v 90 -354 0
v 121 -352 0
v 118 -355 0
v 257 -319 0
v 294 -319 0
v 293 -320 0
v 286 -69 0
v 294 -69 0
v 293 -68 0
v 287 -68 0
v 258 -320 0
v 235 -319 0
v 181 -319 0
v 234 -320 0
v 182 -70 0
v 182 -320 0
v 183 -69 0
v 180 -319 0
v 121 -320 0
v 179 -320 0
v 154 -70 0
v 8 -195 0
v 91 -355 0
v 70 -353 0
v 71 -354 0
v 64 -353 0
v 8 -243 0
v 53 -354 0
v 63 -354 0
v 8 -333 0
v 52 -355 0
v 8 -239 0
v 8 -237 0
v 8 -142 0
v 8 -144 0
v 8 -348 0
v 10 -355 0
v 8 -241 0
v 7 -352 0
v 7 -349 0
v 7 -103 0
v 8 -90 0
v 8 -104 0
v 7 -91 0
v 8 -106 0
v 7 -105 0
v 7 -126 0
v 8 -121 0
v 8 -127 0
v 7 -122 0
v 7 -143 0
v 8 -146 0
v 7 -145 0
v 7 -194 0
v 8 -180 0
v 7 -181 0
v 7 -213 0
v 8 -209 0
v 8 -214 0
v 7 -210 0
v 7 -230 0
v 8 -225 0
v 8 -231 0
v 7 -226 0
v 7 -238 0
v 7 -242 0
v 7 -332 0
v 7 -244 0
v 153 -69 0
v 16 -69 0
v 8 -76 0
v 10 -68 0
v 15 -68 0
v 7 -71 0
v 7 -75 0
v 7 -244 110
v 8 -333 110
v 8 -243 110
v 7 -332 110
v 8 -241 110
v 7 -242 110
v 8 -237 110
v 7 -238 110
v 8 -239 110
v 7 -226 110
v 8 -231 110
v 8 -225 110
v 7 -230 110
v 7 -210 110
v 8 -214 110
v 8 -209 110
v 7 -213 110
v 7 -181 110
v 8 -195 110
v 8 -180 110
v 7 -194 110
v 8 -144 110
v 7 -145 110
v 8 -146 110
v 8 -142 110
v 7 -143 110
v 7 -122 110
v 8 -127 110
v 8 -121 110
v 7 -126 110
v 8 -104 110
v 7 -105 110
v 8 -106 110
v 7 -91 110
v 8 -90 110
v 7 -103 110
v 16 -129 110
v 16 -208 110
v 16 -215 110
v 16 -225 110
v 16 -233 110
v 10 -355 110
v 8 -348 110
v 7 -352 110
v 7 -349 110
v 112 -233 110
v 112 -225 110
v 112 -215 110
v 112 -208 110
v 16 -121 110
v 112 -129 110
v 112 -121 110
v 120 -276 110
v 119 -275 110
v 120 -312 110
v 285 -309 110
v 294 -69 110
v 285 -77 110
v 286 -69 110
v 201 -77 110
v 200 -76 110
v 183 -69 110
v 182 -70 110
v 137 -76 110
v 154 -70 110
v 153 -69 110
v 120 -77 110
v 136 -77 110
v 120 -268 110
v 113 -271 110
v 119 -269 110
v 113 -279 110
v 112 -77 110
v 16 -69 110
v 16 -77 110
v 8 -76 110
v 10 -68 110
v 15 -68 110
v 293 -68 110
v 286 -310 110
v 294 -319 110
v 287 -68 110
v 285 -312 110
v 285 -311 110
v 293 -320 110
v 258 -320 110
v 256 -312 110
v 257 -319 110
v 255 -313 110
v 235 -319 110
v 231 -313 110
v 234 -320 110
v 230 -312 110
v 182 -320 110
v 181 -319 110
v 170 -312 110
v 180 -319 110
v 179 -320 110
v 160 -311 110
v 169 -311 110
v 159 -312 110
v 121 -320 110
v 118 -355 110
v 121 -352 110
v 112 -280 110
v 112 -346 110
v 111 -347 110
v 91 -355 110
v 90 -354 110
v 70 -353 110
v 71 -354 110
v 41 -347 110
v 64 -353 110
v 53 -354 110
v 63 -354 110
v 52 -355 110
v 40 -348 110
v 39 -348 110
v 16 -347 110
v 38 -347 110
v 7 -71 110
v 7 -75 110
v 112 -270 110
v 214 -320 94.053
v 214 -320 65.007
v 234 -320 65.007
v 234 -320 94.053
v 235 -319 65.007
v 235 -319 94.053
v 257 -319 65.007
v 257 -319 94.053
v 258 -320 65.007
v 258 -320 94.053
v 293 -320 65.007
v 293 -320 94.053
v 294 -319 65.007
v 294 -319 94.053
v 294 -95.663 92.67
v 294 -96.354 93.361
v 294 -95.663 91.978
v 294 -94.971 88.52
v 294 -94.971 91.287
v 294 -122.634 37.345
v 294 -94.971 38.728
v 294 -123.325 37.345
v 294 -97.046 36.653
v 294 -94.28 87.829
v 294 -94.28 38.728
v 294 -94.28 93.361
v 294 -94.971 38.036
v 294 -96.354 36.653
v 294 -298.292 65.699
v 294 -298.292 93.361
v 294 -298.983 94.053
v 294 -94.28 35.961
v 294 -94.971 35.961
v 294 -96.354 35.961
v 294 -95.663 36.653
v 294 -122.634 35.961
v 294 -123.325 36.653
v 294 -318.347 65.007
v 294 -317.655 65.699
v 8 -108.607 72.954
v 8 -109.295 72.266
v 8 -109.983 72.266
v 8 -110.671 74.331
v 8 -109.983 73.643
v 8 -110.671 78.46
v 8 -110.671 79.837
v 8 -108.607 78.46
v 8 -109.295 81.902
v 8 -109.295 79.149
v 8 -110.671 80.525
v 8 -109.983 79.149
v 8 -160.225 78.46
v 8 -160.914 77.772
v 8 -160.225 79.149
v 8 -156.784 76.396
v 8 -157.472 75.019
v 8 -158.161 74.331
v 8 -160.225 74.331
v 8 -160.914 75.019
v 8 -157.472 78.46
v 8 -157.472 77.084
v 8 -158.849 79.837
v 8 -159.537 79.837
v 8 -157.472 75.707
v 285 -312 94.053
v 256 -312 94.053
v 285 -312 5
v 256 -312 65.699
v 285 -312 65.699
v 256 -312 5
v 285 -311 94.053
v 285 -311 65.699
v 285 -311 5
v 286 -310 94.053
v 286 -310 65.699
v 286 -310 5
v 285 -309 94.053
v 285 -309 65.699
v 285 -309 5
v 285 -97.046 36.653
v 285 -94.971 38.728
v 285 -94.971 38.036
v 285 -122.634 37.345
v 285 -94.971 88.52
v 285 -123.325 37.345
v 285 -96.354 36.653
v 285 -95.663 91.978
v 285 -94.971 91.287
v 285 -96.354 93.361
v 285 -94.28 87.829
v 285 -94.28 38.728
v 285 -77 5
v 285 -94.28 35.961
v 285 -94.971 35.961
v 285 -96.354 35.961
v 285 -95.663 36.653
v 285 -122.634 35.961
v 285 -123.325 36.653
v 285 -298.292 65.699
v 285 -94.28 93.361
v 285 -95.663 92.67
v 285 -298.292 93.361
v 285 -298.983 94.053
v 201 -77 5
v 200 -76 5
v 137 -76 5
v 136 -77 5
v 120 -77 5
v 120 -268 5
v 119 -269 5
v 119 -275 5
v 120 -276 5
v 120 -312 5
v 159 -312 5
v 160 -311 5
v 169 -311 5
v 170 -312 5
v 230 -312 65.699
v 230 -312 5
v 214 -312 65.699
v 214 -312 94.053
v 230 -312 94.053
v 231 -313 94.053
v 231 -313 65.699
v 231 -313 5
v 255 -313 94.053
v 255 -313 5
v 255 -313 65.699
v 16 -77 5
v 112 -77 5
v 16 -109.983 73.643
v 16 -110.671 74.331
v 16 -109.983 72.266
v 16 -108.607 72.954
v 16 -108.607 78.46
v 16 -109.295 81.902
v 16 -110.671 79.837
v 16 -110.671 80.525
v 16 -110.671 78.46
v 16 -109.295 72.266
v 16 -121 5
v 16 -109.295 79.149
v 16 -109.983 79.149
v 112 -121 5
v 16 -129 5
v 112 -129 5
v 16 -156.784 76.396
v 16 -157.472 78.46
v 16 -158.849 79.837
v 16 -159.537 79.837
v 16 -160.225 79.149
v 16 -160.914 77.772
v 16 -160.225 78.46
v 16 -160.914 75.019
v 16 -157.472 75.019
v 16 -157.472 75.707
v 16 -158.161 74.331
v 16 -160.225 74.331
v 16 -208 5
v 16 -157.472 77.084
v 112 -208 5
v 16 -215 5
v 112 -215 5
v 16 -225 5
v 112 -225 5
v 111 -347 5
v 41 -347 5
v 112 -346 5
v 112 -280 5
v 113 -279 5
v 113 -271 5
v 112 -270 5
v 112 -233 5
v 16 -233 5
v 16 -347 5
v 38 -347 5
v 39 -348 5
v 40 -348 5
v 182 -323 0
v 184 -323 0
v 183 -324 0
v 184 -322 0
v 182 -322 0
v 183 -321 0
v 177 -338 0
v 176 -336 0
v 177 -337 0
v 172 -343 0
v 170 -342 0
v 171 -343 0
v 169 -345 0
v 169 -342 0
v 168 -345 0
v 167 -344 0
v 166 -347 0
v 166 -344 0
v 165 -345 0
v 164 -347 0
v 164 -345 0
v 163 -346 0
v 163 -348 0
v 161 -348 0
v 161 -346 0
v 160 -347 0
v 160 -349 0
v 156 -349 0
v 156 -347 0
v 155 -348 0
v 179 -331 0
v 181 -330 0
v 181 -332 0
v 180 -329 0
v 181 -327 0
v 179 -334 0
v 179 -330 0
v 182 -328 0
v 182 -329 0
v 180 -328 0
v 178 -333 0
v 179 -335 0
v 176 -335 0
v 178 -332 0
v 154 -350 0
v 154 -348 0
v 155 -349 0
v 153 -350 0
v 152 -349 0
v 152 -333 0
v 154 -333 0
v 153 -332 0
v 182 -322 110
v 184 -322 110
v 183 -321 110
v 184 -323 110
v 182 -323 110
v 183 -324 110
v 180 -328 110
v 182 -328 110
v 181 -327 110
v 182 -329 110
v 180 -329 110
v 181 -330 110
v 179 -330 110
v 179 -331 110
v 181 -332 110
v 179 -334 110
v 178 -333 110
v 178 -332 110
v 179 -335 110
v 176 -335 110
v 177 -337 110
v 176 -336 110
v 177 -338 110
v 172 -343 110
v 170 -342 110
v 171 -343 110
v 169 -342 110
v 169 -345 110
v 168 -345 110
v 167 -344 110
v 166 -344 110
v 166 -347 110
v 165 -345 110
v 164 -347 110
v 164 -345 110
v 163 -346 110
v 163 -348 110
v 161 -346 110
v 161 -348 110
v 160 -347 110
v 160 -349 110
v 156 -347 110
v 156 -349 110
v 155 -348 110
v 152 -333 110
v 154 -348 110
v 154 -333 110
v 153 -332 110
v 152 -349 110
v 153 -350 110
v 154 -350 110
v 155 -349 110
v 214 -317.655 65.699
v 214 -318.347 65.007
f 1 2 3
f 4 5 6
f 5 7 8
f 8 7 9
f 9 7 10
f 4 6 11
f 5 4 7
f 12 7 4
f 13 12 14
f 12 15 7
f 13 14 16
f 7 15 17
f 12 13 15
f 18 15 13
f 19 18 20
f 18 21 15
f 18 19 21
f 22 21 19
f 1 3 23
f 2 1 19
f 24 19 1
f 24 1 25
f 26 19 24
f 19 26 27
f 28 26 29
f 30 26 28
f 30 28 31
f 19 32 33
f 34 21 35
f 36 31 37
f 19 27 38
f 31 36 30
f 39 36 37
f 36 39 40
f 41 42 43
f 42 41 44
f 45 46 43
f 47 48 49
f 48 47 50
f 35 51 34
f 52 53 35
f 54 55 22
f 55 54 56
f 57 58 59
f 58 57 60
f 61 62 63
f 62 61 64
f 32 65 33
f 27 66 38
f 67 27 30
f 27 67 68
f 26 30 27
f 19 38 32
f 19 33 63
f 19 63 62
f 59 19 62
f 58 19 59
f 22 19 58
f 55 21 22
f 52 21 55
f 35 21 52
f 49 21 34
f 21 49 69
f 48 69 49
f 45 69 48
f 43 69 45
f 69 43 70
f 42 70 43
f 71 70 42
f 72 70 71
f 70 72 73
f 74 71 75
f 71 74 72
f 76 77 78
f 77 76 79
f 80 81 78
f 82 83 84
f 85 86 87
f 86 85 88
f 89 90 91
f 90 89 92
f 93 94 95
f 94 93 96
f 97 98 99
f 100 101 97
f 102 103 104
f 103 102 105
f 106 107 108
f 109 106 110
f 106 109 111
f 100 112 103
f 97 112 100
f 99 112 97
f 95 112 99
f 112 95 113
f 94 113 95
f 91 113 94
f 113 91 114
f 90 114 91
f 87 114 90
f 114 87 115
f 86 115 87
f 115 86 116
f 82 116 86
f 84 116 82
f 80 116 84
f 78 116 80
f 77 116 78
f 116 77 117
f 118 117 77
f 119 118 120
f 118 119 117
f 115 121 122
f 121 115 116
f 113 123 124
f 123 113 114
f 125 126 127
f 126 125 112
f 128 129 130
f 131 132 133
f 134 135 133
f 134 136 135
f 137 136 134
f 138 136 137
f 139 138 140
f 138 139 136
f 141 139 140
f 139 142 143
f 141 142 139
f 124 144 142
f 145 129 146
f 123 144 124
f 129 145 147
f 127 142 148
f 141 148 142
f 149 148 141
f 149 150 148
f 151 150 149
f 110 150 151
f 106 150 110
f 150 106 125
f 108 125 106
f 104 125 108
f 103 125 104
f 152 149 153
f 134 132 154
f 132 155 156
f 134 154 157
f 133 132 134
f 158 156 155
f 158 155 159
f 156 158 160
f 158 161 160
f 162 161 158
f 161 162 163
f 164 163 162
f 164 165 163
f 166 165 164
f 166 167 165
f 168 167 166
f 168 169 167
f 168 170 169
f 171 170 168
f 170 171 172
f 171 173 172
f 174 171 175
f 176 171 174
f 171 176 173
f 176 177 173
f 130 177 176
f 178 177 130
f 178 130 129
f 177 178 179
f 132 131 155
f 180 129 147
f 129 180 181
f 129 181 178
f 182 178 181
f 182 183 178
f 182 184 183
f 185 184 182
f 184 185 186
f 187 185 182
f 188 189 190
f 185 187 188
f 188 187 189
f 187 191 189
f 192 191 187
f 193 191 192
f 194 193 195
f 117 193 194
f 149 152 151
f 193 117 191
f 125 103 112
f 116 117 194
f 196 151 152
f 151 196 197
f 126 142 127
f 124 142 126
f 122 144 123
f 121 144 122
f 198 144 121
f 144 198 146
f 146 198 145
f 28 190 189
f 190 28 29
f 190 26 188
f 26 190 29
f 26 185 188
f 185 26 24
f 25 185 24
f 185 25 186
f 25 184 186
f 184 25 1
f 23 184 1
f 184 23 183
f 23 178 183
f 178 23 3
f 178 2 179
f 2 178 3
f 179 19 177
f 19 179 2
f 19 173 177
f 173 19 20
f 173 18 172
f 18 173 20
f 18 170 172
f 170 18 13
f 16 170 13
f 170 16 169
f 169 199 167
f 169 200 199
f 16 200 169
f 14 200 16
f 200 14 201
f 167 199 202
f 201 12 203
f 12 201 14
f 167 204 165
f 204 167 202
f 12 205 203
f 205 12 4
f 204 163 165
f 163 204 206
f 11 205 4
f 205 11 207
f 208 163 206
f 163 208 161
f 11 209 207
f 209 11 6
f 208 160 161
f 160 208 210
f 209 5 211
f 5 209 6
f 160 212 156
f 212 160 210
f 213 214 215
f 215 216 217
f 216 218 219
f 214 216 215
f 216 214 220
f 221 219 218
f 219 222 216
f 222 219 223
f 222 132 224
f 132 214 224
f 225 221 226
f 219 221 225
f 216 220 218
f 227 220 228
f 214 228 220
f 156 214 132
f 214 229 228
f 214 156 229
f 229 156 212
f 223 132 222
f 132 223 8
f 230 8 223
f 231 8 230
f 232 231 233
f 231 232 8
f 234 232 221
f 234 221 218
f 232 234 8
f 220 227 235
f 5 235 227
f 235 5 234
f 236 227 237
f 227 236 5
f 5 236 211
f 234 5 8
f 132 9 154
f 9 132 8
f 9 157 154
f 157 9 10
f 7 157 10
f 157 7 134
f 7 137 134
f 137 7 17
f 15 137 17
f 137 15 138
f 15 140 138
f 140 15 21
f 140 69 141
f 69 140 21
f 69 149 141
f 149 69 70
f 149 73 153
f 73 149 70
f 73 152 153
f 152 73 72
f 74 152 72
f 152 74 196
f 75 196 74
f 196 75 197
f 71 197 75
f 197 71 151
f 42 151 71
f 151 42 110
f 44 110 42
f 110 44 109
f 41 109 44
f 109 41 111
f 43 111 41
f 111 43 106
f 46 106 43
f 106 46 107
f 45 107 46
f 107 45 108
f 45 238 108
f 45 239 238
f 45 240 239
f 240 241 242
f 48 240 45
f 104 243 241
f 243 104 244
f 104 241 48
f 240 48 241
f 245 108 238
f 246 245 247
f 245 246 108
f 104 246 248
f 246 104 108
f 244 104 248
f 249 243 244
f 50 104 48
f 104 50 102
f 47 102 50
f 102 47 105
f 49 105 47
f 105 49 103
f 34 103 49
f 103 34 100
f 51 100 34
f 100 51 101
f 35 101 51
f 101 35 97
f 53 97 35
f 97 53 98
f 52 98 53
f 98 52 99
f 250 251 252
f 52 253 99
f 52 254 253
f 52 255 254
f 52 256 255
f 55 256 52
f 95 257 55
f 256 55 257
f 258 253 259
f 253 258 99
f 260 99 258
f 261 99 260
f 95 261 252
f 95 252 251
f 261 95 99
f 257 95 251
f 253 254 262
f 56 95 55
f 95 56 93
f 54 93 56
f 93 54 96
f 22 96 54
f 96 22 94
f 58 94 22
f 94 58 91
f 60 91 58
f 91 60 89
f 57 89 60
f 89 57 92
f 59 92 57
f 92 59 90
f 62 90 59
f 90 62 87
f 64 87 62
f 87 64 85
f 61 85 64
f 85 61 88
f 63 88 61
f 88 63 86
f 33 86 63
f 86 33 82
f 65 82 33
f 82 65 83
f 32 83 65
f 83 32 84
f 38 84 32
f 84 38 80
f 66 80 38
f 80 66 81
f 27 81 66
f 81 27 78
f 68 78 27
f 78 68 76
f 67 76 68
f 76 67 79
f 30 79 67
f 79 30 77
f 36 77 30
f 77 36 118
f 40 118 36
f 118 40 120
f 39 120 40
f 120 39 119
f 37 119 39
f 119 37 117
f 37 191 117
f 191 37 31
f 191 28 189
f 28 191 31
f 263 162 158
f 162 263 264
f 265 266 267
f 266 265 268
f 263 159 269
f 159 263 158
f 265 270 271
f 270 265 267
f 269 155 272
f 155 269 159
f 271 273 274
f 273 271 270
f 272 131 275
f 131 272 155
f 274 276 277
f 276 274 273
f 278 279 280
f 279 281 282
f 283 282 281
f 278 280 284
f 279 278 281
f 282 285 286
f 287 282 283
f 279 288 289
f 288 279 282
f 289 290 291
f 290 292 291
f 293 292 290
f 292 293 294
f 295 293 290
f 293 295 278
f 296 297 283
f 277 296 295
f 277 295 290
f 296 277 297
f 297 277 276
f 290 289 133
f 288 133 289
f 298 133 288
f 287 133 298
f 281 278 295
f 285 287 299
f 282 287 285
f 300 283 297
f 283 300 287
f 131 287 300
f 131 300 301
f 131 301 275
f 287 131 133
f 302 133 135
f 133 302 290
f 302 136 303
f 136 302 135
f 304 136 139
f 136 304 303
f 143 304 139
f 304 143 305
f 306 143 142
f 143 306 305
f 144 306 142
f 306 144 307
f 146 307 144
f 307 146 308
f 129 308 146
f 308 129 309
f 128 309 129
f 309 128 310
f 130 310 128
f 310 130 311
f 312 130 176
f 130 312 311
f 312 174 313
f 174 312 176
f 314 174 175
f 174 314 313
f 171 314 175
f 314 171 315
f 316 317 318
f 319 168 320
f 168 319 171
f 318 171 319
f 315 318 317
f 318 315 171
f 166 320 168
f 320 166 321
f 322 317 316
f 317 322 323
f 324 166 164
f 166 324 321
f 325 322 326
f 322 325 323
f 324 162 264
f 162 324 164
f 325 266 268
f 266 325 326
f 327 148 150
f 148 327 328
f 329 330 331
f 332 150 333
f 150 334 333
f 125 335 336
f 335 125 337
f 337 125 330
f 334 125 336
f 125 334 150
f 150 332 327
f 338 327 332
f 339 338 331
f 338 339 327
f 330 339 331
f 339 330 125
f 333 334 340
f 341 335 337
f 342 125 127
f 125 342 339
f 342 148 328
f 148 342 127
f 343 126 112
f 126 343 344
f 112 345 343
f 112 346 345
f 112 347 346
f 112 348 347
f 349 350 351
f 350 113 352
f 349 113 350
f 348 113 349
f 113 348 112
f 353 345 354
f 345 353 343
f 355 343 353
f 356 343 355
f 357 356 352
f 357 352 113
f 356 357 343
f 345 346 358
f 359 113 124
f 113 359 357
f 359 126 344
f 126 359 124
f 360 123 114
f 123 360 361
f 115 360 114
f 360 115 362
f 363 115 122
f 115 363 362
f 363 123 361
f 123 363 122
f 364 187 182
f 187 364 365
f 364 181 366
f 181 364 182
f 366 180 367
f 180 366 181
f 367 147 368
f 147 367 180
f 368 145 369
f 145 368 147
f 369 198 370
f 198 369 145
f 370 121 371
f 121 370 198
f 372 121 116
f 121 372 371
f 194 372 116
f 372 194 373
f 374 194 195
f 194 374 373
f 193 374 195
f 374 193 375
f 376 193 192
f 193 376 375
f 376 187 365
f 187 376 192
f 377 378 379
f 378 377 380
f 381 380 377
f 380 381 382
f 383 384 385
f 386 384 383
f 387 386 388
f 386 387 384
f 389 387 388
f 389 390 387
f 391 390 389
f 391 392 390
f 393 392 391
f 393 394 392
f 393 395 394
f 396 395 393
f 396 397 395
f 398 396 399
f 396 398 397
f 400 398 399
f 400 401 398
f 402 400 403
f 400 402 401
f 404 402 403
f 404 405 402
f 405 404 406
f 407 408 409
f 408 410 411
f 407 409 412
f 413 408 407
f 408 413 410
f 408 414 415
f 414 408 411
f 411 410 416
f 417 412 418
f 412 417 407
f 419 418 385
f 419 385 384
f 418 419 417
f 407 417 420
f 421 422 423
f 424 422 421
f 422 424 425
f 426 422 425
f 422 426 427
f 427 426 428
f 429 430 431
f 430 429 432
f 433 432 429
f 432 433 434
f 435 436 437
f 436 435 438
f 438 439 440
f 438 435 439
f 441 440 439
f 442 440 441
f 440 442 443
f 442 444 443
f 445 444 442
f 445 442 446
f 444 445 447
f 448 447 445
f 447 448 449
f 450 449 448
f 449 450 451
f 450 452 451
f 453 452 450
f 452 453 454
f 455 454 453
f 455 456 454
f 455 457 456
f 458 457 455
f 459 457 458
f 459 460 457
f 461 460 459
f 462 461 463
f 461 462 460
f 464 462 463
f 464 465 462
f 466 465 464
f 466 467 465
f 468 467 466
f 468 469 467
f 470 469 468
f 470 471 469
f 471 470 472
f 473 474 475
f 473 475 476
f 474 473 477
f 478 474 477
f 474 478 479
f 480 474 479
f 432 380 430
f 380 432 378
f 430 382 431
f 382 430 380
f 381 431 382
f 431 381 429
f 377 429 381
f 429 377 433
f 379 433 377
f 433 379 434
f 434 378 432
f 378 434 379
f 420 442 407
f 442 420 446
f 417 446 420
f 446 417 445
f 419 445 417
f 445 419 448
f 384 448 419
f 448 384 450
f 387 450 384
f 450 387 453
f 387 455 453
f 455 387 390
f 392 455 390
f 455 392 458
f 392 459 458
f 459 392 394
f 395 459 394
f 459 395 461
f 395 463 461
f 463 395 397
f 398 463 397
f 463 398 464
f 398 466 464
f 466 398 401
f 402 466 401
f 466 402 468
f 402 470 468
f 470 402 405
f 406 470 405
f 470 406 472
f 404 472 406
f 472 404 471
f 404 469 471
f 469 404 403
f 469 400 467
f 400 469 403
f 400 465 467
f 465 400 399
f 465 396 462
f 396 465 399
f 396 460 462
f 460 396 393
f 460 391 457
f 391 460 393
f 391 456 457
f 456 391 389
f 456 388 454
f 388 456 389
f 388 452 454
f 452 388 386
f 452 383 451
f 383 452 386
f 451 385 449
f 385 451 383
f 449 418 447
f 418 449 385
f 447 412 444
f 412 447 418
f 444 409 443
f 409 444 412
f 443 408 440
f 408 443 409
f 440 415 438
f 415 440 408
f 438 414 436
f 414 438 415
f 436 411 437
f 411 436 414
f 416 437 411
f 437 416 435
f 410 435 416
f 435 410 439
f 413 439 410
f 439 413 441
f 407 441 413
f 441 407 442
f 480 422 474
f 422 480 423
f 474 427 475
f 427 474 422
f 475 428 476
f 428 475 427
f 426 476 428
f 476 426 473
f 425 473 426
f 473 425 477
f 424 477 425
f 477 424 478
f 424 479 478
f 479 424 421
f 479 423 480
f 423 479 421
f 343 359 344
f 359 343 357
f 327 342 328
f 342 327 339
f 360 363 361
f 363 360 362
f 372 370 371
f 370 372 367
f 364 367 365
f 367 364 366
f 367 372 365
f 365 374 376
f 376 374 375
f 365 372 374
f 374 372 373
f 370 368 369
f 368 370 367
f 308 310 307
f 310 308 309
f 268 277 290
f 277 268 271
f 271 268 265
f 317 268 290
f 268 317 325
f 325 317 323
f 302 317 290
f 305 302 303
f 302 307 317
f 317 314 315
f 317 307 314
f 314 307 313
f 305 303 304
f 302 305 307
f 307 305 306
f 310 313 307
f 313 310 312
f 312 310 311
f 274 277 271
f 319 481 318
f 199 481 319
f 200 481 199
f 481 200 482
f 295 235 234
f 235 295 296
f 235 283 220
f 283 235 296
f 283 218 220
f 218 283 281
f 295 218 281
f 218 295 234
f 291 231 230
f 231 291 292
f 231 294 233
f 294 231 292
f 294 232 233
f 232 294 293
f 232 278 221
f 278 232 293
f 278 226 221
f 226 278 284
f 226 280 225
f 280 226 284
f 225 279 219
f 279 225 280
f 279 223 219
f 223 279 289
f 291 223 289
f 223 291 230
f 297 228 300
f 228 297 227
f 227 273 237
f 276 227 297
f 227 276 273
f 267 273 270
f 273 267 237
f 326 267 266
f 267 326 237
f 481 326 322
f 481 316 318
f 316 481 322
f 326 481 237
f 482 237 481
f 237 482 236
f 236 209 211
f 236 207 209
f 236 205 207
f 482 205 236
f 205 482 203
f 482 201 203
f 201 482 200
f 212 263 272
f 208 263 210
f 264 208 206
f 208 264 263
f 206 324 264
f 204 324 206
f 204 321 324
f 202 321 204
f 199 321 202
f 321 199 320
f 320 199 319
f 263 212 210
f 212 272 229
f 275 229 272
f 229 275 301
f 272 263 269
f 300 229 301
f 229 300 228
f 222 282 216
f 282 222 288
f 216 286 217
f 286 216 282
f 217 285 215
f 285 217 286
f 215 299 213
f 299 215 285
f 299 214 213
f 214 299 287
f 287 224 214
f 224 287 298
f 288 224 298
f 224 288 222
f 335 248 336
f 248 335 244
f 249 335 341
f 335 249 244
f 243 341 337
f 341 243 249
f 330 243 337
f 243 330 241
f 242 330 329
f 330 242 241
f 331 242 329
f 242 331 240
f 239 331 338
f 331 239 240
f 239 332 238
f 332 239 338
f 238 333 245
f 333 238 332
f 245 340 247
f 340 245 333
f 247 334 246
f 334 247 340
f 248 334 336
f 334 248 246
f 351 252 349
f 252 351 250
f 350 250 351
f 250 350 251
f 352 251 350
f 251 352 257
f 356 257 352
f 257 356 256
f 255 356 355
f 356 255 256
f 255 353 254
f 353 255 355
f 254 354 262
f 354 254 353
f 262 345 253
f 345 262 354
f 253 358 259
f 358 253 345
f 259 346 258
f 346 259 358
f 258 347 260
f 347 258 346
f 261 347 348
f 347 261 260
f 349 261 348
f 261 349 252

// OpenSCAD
mirror(v = [0, 1, 0]) {
	color(c = [1, 0, 0]) {
		difference() {
			mirror(v = [0, 1, 0]) {
				union() {
					union() {
						difference() {
							linear_extrude(height = 110.0) {
								mirror(v = [0, 1, 0]) {
									polygon(paths = [[0, 1, 2, 3, 4, 5, 6, 7, 8, 9, 10, 11, 12, 13, 14, 15, 16, 17, 18, 19, 20, 21, 22, 23, 24, 25, 26, 27, 28, 29, 30, 31, 32, 33, 34, 35, 36, 37, 38, 39, 40, 41, 42, 43, 44, 45, 46, 47, 48, 49, 50, 51, 52, 53, 54, 55, 56, 57, 58, 59, 60, 61, 62, 63, 64, 65, 66, 67, 68, 69, 70, 71, 72, 73, 74]], points = [[10, 68], [15, 68], [16, 69], [153, 69], [154, 70], [182, 70], [183, 69], [286, 69], [287, 68], [293, 68], [294, 69], [294, 319], [293, 320], [258, 320], [257, 319], [235, 319], [234, 320], [182, 320], [181, 319], [180, 319], [179, 320], [121, 320], [121, 352], [118, 355], [91, 355], [90, 354], [71, 354], [70, 353], [64, 353], [63, 354], [53, 354], [52, 355], [10, 355], [7, 352], [7, 349], [8, 348], [8, 333], [7, 332], [7, 244], [8, 243], [7, 242], [8, 241], [8, 239], [7, 238], [8, 237], [8, 231], [7, 230], [7, 226], [8, 225], [8, 214], [7, 213], [7, 210], [8, 209], [8, 195], [7, 194], [7, 181], [8, 180], [8, 146], [7, 145], [8, 144], [7, 143], [8, 142], [8, 127], [7, 126], [7, 122], [8, 121], [8, 106], [7, 105], [8, 104], [7, 103], [7, 91], [8, 90], [8, 76], [7, 75], [7, 71]]);
								}
							}
							linear_extrude(height = 110.0) {
								mirror(v = [0, 1, 0]) {
									polygon(paths = [[0, 1, 2, 3, 4, 5, 6, 7, 8, 9, 10, 11, 12]], points = [[16, 233], [16, 347], [38, 347], [39, 348], [40, 348], [41, 347], [111, 347], [112, 346], [112, 280], [113, 279], [113, 271], [112, 270], [112, 233]]);
								}
								mirror(v = [0, 1, 0]) {
									polygon(paths = [[0, 1, 2, 3]], points = [[16, 215], [16, 225], [112, 225], [112, 215]]);
								}
								mirror(v = [0, 1, 0]) {
									polygon(paths = [[0, 1, 2, 3]], points = [[16, 129], [16, 208], [112, 208], [112, 129]]);
								}
								mirror(v = [0, 1, 0]) {
									polygon(paths = [[0, 1, 2, 3]], points = [[16, 77], [16, 121], [112, 121], [112, 77]]);
								}
								mirror(v = [0, 1, 0]) {
									polygon(paths = [[0, 1, 2, 3, 4, 5, 6, 7, 8, 9, 10, 11, 12, 13, 14, 15, 16, 17, 18, 19, 20, 21, 22]], points = [[137, 76], [136, 77], [120, 77], [120, 268], [119, 269], [119, 275], [120, 276], [120, 312], [159, 312], [160, 311], [169, 311], [170, 312], [230, 312], [231, 313], [255, 313], [256, 312], [285, 312], [285, 311], [286, 310], [285, 309], [285, 77], [201, 77], [200, 76]]);
								}
							}
						}
						linear_extrude(height = 110.0) {
							mirror(v = [0, 1, 0]) {
								polygon(paths = [[0, 1, 2, 3, 4, 5]], points = [[155, 348], [156, 347], [160, 347], [161, 348], [160, 349], [156, 349]]);
							}
							mirror(v = [0, 1, 0]) {
								polygon(paths = [[0, 1, 2, 3, 4, 5]], points = [[160, 347], [161, 346], [163, 346], [164, 347], [163, 348], [161, 348]]);
							}
							mirror(v = [0, 1, 0]) {
								polygon(paths = [[0, 1, 2, 3, 4, 5, 6, 7]], points = [[165, 345], [166, 344], [167, 344], [168, 345], [166, 347], [164, 347], [163, 346], [164, 345]]);
							}
							mirror(v = [0, 1, 0]) {
								polygon(paths = [[0, 1, 2, 3, 4, 5]], points = [[169, 342], [170, 342], [171, 343], [169, 345], [168, 345], [167, 344]]);
							}
							mirror(v = [0, 1, 0]) {
								polygon(paths = [[0, 1, 2, 3, 4, 5]], points = [[176, 336], [177, 337], [177, 338], [172, 343], [171, 343], [170, 342]]);
							}
							mirror(v = [0, 1, 0]) {
								polygon(paths = [[0, 1, 2, 3, 4, 5]], points = [[178, 333], [179, 334], [179, 335], [177, 337], [176, 336], [176, 335]]);
							}
							mirror(v = [0, 1, 0]) {
								polygon(paths = [[0, 1, 2, 3, 4, 5, 6, 7]], points = [[152, 333], [153, 332], [154, 333], [154, 348], [155, 349], [154, 350], [153, 350], [152, 349]]);
							}
							mirror(v = [0, 1, 0]) {
								polygon(paths = [[0, 1, 2, 3, 4, 5, 6, 7]], points = [[179, 330], [180, 329], [181, 330], [181, 332], [179, 334], [178, 333], [178, 332], [179, 331]]);
							}
							mirror(v = [0, 1, 0]) {
								polygon(paths = [[0, 1, 2, 3, 4, 5]], points = [[180, 328], [181, 327], [182, 328], [182, 329], [181, 330], [180, 329]]);
							}
							mirror(v = [0, 1, 0]) {
								polygon(paths = [[0, 1, 2, 3, 4, 5]], points = [[182, 322], [183, 321], [184, 322], [184, 323], [183, 324], [182, 323]]);
							}
						}
					}
					color(c = [1, 0, 0]) {
						linear_extrude(height = 5) {
							mirror(v = [0, 1, 0]) {
								polygon(paths = [[0, 1, 2, 3, 4, 5, 6, 7, 8, 9, 10, 11, 12, 13, 14, 15, 16, 17, 18, 19, 20, 21, 22, 23, 24, 25, 26, 27, 28, 29, 30, 31, 32, 33, 34, 35, 36, 37, 38, 39, 40, 41, 42, 43, 44, 45, 46, 47, 48, 49, 50, 51, 52, 53, 54, 55, 56, 57, 58, 59, 60, 61, 62, 63, 64, 65, 66, 67, 68, 69, 70, 71, 72, 73, 74]], points = [[10, 68], [15, 68], [16, 69], [153, 69], [154, 70], [182, 70], [183, 69], [286, 69], [287, 68], [293, 68], [294, 69], [294, 319], [293, 320], [258, 320], [257, 319], [235, 319], [234, 320], [182, 320], [181, 319], [180, 319], [179, 320], [121, 320], [121, 352], [118, 355], [91, 355], [90, 354], [71, 354], [70, 353], [64, 353], [63, 354], [53, 354], [52, 355], [10, 355], [7, 352], [7, 349], [8, 348], [8, 333], [7, 332], [7, 244], [8, 243], [7, 242], [8, 241], [8, 239], [7, 238], [8, 237], [8, 231], [7, 230], [7, 226], [8, 225], [8, 214], [7, 213], [7, 210], [8, 209], [8, 195], [7, 194], [7, 181], [8, 180], [8, 146], [7, 145], [8, 144], [7, 143], [8, 142], [8, 127], [7, 126], [7, 122], [8, 121], [8, 106], [7, 105], [8, 104], [7, 103], [7, 91], [8, 90], [8, 76], [7, 75], [7, 71]]);
							}
						}
					}
				}
			}
			union() {
				union() {
					union() {
						union() {
							translate(v = [302.3188405797101, 48, 126.8623188405797]) {
								rotate(a = 90, v = [-1, 0, 0]) {
									rotate(a = 180, v = [0, 1, 0]) {
										linear_extrude(center = true, height = 200) {
											polygon(paths = [[0, 1, 2, 3]], points = [[248.1787439614, 81.8019323671], [248.8719806763, 81.1086956522], [249.5652173913, 81.8019323671], [248.8719806763, 82.4951690821]]);
											polygon(paths = [[0, 1, 2, 3, 4, 5, 6, 7, 8, 9]], points = [[220.4492753623, 59.6183574879], [221.1425120773, 58.9251207729], [221.8357487923, 58.9251207729], [222.5289855072, 59.6183574879], [222.5289855072, 61.0048309179], [223.2222222222, 61.6980676329], [222.5289855072, 62.3913043478], [222.5289855072, 63.0845410628], [221.8357487923, 63.7777777778], [220.4492753623, 62.3913043478]]);
											polygon(paths = [[0, 1, 2, 3, 4, 5, 6, 7, 8, 9, 10, 11, 12, 13, 14, 15, 16, 17, 18, 19, 20, 21, 22, 23, 24, 25, 26, 27, 28, 29, 30, 31, 32, 33, 34, 35, 36, 37, 38, 39, 40, 41, 42, 43, 44, 45, 46, 47, 48, 49, 50, 51, 52, 53, 54, 55, 56, 57, 58, 59, 60, 61, 62, 63, 64, 65, 66, 67, 68, 69, 70, 71, 72, 73, 74, 75, 76, 77, 78, 79, 80, 81, 82, 83, 84]], points = [[228.0748792271, 51.2995169082], [228.7681159420, 51.9927536232], [228.7681159420, 61.0048309179], [229.4613526570, 61.6980676329], [229.4613526570, 64.4710144928], [230.1545893720, 65.1642512077], [230.1545893720, 67.2439613527], [230.1545893720, 66.5507246377], [230.8478260870, 65.8574879227], [230.8478260870, 65.1642512077], [231.5410628019, 64.4710144928], [231.5410628019, 63.0845410628], [232.2342995169, 62.3913043478], [232.2342995169, 61.6980676329], [232.9275362319, 61.0048309179], [233.6207729469, 61.0048309179], [235.0072463768, 62.3913043478], [235.0072463768, 61.6980676329], [236.3937198068, 60.3115942029], [237.7801932367, 61.6980676329], [237.7801932367, 62.3913043478], [238.4734299517, 63.0845410628], [238.4734299517, 67.9371980676], [239.1666666667, 68.6304347826], [239.1666666667, 74.8695652174], [238.4734299517, 75.5628019324], [238.4734299517, 76.2560386473], [237.0869565217, 77.6425120773], [236.3937198068, 77.6425120773], [235.7004830918, 76.9492753623], [234.3140096618, 76.9492753623], [234.3140096618, 77.6425120773], [232.9275362319, 79.0289855072], [233.6207729469, 79.7222222222], [237.0869565217, 79.7222222222], [237.7801932367, 80.4154589372], [238.4734299517, 80.4154589372], [239.1666666667, 81.1086956522], [239.1666666667, 81.8019323671], [239.8599033816, 82.4951690821], [239.8599033816, 83.1884057971], [239.1666666667, 83.8816425121], [239.1666666667, 84.5748792271], [238.4734299517, 85.2681159420], [237.0869565217, 85.2681159420], [236.3937198068, 85.9613526570], [235.7004830918, 85.2681159420], [234.3140096618, 85.2681159420], [233.6207729469, 85.9613526570], [230.1545893720, 85.9613526570], [229.4613526570, 86.6545893720], [228.7681159420, 86.6545893720], [228.0748792271, 87.3478260870], [226.6884057971, 87.3478260870], [225.9951690821, 86.6545893720], [223.9154589372, 86.6545893720], [223.2222222222, 85.9613526570], [219.7560386473, 85.9613526570], [218.3695652174, 84.5748792271], [217.6763285024, 84.5748792271], [216.9830917874, 83.8816425121], [217.6763285024, 83.1884057971], [217.6763285024, 82.4951690821], [219.7560386473, 80.4154589372], [223.2222222222, 80.4154589372], [223.9154589372, 79.7222222222], [223.9154589372, 79.0289855072], [224.6086956522, 78.3357487923], [223.9154589372, 77.6425120773], [223.9154589372, 74.8695652174], [223.2222222222, 74.1763285024], [223.9154589372, 73.4830917874], [223.9154589372, 69.3236714976], [224.6086956522, 68.6304347826], [224.6086956522, 67.9371980676], [223.9154589372, 67.2439613527], [223.9154589372, 65.1642512077], [224.6086956522, 64.4710144928], [224.6086956522, 60.3115942029], [225.3019323671, 59.6183574879], [225.3019323671, 58.2318840580], [225.9951690821, 57.5386473430], [225.9951690821, 54.0724637681], [226.6884057971, 53.3792270531], [226.6884057971, 52.6859903382]]);
											polygon(paths = [[0, 1, 2, 3, 4, 5]], points = [[123.3961352657, 36.0483091787], [124.0893719807, 35.3550724638], [125.4758454106, 35.3550724638], [126.1690821256, 36.0483091787], [125.4758454106, 36.7415458937], [124.0893719807, 36.7415458937]]);
											polygon(paths = [[0, 1, 2, 3]], points = [[1.3864734300, 25.6497584541], [2.0797101449, 24.9565217391], [2.7729468599, 25.6497584541], [2.0797101449, 26.3429951691]]);
											polygon(paths = [[0, 1, 2, 3]], points = [[103.2922705314, 22.1835748792], [103.9855072464, 21.4903381643], [104.6787439614, 22.1835748792], [103.9855072464, 22.8768115942]]);
											polygon(paths = [[0, 1, 2, 3, 4, 5, 6, 7, 8, 9, 10, 11, 12, 13, 14]], points = [[117.1570048309, 21.4903381643], [117.8502415459, 20.7971014493], [142.1135265700, 20.7971014493], [142.8067632850, 21.4903381643], [142.1135265700, 22.1835748792], [141.4202898551, 22.1835748792], [140.7270531401, 22.8768115942], [134.4879227053, 22.8768115942], [133.1014492754, 24.2632850242], [122.7028985507, 24.2632850242], [122.0096618357, 23.5700483092], [122.0096618357, 22.8768115942], [119.2367149758, 22.8768115942], [118.5434782609, 22.1835748792], [117.8502415459, 22.1835748792]]);
											polygon(paths = [[0, 1, 2, 3, 4, 5, 6, 7, 8, 9, 10, 11]], points = [[113.6908212560, 19.4106280193], [114.3840579710, 18.7173913043], [140.7270531401, 18.7173913043], [141.4202898551, 19.4106280193], [140.7270531401, 20.1038647343], [140.0338164251, 20.1038647343], [139.3405797101, 20.7971014493], [124.0893719807, 20.7971014493], [123.3961352657, 20.1038647343], [122.7028985507, 20.7971014493], [122.0096618357, 20.1038647343], [114.3840579710, 20.1038647343]]);
											polygon(paths = [[0, 1, 2, 3, 4, 5, 6, 7, 8, 9, 10, 11, 12, 13]], points = [[108.1449275362, 18.7173913043], [108.8381642512, 18.0241545894], [112.3043478261, 18.0241545894], [113.6908212560, 19.4106280193], [112.9975845411, 20.1038647343], [112.3043478261, 20.1038647343], [111.6111111111, 19.4106280193], [110.9178743961, 19.4106280193], [110.2246376812, 20.1038647343], [108.1449275362, 20.1038647343], [107.4516908213, 20.7971014493], [106.7584541063, 20.1038647343], [106.7584541063, 19.4106280193], [107.4516908213, 18.7173913043]]);
											polygon(paths = [[0, 1, 2, 3, 4, 5, 6, 7, 8]], points = [[106.0652173913, 17.3309178744], [108.1449275362, 17.3309178744], [108.8381642512, 18.0241545894], [108.1449275362, 18.7173913043], [107.4516908213, 18.7173913043], [106.0652173913, 20.1038647343], [105.3719806763, 20.1038647343], [104.6787439614, 19.4106280193], [104.6787439614, 18.7173913043]]);
											polygon(paths = [[0]], points = [[232.9275362319, 122.7028985507]]);
											polygon(paths = [[0, 1, 2, 3, 4, 5, 6, 7, 8, 9, 10, 11, 12, 13, 14, 15, 16, 17, 18, 19, 20, 21, 22, 23, 24, 25, 26, 27, 28, 29, 30, 31, 32, 33, 34, 35, 36, 37, 38, 39, 40, 41, 42, 43]], points = [[173.3091787440, 92.8937198068], [173.3091787440, 94.2801932367], [172.6159420290, 94.9734299517], [172.6159420290, 95.6666666667], [171.9227053140, 96.3599033816], [171.9227053140, 97.0531400966], [171.2294685990, 97.7463768116], [171.2294685990, 112.3043478261], [170.5362318841, 112.9975845411], [170.5362318841, 114.3840579710], [171.2294685990, 115.0772946860], [171.2294685990, 117.1570048309], [171.9227053140, 116.4637681159], [172.6159420290, 116.4637681159], [173.3091787440, 117.1570048309], [173.3091787440, 116.4637681159], [174.0024154589, 115.7705314010], [174.0024154589, 115.0772946860], [174.6956521739, 114.3840579710], [174.6956521739, 111.6111111111], [175.3888888889, 110.9178743961], [175.3888888889, 110.2246376812], [176.0821256039, 109.5314009662], [176.0821256039, 107.4516908213], [177.4685990338, 106.0652173913], [178.1618357488, 106.7584541063], [179.5483091787, 105.3719806763], [180.2415458937, 105.3719806763], [180.2415458937, 104.6787439614], [180.9347826087, 103.9855072464], [180.9347826087, 102.5990338164], [181.6280193237, 101.9057971014], [181.6280193237, 99.8260869565], [180.2415458937, 98.4396135266], [178.8550724638, 99.8260869565], [178.1618357488, 99.8260869565], [176.7753623188, 98.4396135266], [176.7753623188, 97.7463768116], [176.0821256039, 97.0531400966], [176.0821256039, 95.6666666667], [175.3888888889, 95.6666666667], [174.6956521739, 94.9734299517], [174.6956521739, 93.5869565217], [174.0024154589, 93.5869565217]]);
											polygon(paths = [[0, 1]], points = [[100.5193236715, 85.2681159420], [100.5193236715, 87.3478260870]]);
											polygon(paths = [[0, 1, 2, 3, 4, 5, 6, 7, 8, 9, 10, 11, 12, 13, 14, 15, 16, 17, 18, 19, 20, 21, 22, 23, 24, 25, 26, 27, 28, 29, 30, 31, 32, 33, 34, 35, 36, 37]], points = [[90.8140096618, 85.2681159420], [90.1207729469, 85.9613526570], [88.7342995169, 85.9613526570], [88.0410628019, 86.6545893720], [86.6545893720, 86.6545893720], [85.9613526570, 85.9613526570], [83.1884057971, 85.9613526570], [82.4951690821, 86.6545893720], [81.1086956522, 86.6545893720], [79.7222222222, 88.0410628019], [81.1086956522, 89.4275362319], [81.1086956522, 90.1207729469], [82.4951690821, 91.5072463768], [82.4951690821, 92.2004830918], [83.8816425121, 93.5869565217], [83.8816425121, 94.2801932367], [84.5748792271, 94.2801932367], [85.2681159420, 94.9734299517], [86.6545893720, 94.9734299517], [87.3478260870, 94.2801932367], [88.0410628019, 94.2801932367], [88.7342995169, 94.9734299517], [89.4275362319, 94.9734299517], [90.1207729469, 95.6666666667], [90.8140096618, 95.6666666667], [91.5072463768, 96.3599033816], [92.2004830918, 95.6666666667], [92.8937198068, 95.6666666667], [94.2801932367, 94.2801932367], [94.2801932367, 93.5869565217], [94.9734299517, 92.8937198068], [94.9734299517, 92.2004830918], [95.6666666667, 91.5072463768], [95.6666666667, 90.8140096618], [96.3599033816, 90.1207729469], [96.3599033816, 88.0410628019], [97.0531400966, 87.3478260870], [94.9734299517, 85.2681159420]]);
										}
									}
								}
							}
							translate(v = [0.01703163017031617, 375, 139.6593673965937]) {
								rotate(a = 90, v = [1, 0, 0]) {
									rotate(a = 180, v = [1, 0, 0]) {
										linear_extrude(center = true, height = 200) {
											polygon(paths = [[0, 1, 2, 3, 4, 5, 6, 7, 8, 9, 10, 11, 12, 13, 14]], points = [[162.0048661800, 113.1240875912], [160.6082725061, 114.5206812652], [158.5133819951, 114.5206812652], [157.8150851582, 113.8223844282], [157.1167883212, 113.8223844282], [157.1167883212, 133.3746958637], [156.4184914842, 134.0729927007], [156.4184914842, 135.4695863747], [161.3065693431, 135.4695863747], [162.0048661800, 134.7712895377], [162.7031630170, 134.7712895377], [163.4014598540, 135.4695863747], [164.7980535280, 135.4695863747], [164.0997566910, 134.7712895377], [164.0997566910, 113.1240875912]]);
											polygon(paths = [[0, 1, 2, 3, 4, 5]], points = [[161.3065693431, 120.8053527981], [162.0048661800, 120.1070559611], [162.7031630170, 120.8053527981], [162.7031630170, 125.6934306569], [162.0048661800, 126.3917274939], [161.3065693431, 125.6934306569]]);
											polygon(paths = [[0, 1, 2, 3, 4, 5, 6, 7]], points = [[158.5133819951, 118.7104622871], [159.2116788321, 118.0121654501], [159.9099756691, 118.0121654501], [160.6082725061, 118.7104622871], [160.6082725061, 120.1070559611], [159.9099756691, 120.8053527981], [159.2116788321, 120.8053527981], [158.5133819951, 120.1070559611]]);
											polygon(paths = [[0, 1, 2, 3]], points = [[158.5133819951, 115.9172749392], [159.2116788321, 115.2189781022], [159.9099756691, 115.9172749392], [159.2116788321, 116.6155717762]]);
											polygon(paths = [[0, 1, 2, 3, 4, 5]], points = [[161.3065693431, 113.8223844282], [162.0048661800, 113.1240875912], [162.7031630170, 113.1240875912], [163.4014598540, 113.8223844282], [162.7031630170, 114.5206812652], [162.0048661800, 114.5206812652]]);
											polygon(paths = [[0, 1, 2, 3, 4, 5, 6, 7, 8, 9, 10, 11, 12, 13, 14, 15]], points = [[171.7810218978, 112.4257907543], [171.7810218978, 113.8223844282], [171.0827250608, 114.5206812652], [171.0827250608, 116.6155717762], [171.7810218978, 117.3138686131], [171.7810218978, 132.6763990268], [171.0827250608, 133.3746958637], [171.0827250608, 135.4695863747], [179.4622871046, 135.4695863747], [179.4622871046, 119.4087591241], [178.7639902676, 118.7104622871], [179.4622871046, 118.0121654501], [178.7639902676, 117.3138686131], [178.7639902676, 113.1240875912], [175.9708029197, 113.1240875912], [175.2725060827, 112.4257907543]]);
											polygon(paths = [[0]], points = [[274.4306569343, 101.2530413625]]);
											polygon(paths = [[0, 1]], points = [[90.0802919708, 101.2530413625], [90.7785888078, 101.2530413625]]);
											polygon(paths = [[0, 1]], points = [[89.3819951338, 96.3649635036], [90.0802919708, 97.0632603406]]);
											polygon(paths = [[0, 1, 2, 3, 4, 5, 6, 7, 8, 9, 10, 11, 12, 13, 14, 15, 16, 17]], points = [[159.9099756691, 81.7007299270], [159.2116788321, 82.3990267640], [157.1167883212, 82.3990267640], [157.1167883212, 102.6496350365], [156.4184914842, 103.3479318735], [156.4184914842, 104.7445255474], [157.8150851582, 104.7445255474], [158.5133819951, 104.0462287105], [162.7031630170, 104.0462287105], [163.4014598540, 104.7445255474], [164.0997566910, 104.7445255474], [164.7980535280, 104.0462287105], [164.7980535280, 87.2871046229], [164.0997566910, 86.5888077859], [164.0997566910, 81.7007299270], [163.4014598540, 82.3990267640], [162.7031630170, 82.3990267640], [162.0048661800, 81.7007299270]]);
											polygon(paths = [[0, 1, 2, 3]], points = [[157.8150851582, 103.3479318735], [158.5133819951, 102.6496350365], [159.2116788321, 103.3479318735], [158.5133819951, 104.0462287105]]);
											polygon(paths = [[0, 1, 2, 3]], points = [[159.9099756691, 94.2700729927], [160.6082725061, 93.5717761557], [161.3065693431, 94.2700729927], [160.6082725061, 94.9683698297]]);
											polygon(paths = [[0, 1, 2, 3, 4, 5, 6, 7]], points = [[159.2116788321, 91.4768856448], [159.9099756691, 90.7785888078], [160.6082725061, 90.7785888078], [161.3065693431, 91.4768856448], [161.3065693431, 92.8734793187], [160.6082725061, 93.5717761557], [159.9099756691, 93.5717761557], [159.2116788321, 92.8734793187]]);
											polygon(paths = [[0, 1, 2, 3, 4, 5]], points = [[161.3065693431, 90.7785888078], [162.0048661800, 90.0802919708], [162.7031630170, 90.7785888078], [162.7031630170, 96.3649635036], [162.0048661800, 97.0632603406], [161.3065693431, 96.3649635036]]);
											polygon(paths = [[0, 1, 2, 3, 4, 5, 6, 7, 8]], points = [[158.5133819951, 86.5888077859], [159.2116788321, 85.8905109489], [159.9099756691, 85.8905109489], [160.6082725061, 86.5888077859], [160.6082725061, 90.0802919708], [159.9099756691, 90.7785888078], [159.2116788321, 90.0802919708], [159.2116788321, 89.3819951338], [158.5133819951, 88.6836982968]]);
											polygon(paths = [[0, 1, 2, 3]], points = [[159.9099756691, 83.0973236010], [160.6082725061, 82.3990267640], [161.3065693431, 83.0973236010], [160.6082725061, 83.7956204380]]);
											polygon(paths = [[0, 1, 2, 3, 4]], points = [[182.2554744526, 66.3381995134], [182.2554744526, 74.7177615572], [182.9537712895, 75.4160583942], [182.9537712895, 77.5109489051], [182.9537712895, 67.0364963504]]);
											polygon(paths = [[0, 1, 2, 3, 4, 5, 6, 7, 8, 9, 10, 11, 12, 13, 14, 15, 16, 17, 18, 19, 20, 21, 22, 23, 24, 25, 26, 27, 28, 29, 30, 31, 32, 33, 34, 35, 36, 37, 38, 39, 40, 41, 42, 43, 44, 45, 46, 47, 48, 49]], points = [[171.0827250608, 65.6399026764], [171.0827250608, 74.7177615572], [174.5742092457, 74.7177615572], [175.2725060827, 74.0194647202], [176.6690997567, 74.0194647202], [177.3673965937, 74.7177615572], [179.4622871046, 74.7177615572], [180.1605839416, 75.4160583942], [179.4622871046, 76.1143552311], [180.1605839416, 76.8126520681], [179.4622871046, 77.5109489051], [180.1605839416, 78.2092457421], [179.4622871046, 78.9075425791], [178.7639902676, 78.9075425791], [178.0656934307, 79.6058394161], [178.7639902676, 80.3041362530], [177.3673965937, 81.7007299270], [171.7810218978, 81.7007299270], [171.7810218978, 84.4939172749], [171.0827250608, 85.1922141119], [171.7810218978, 85.8905109489], [171.7810218978, 95.6666666667], [171.0827250608, 96.3649635036], [171.7810218978, 97.0632603406], [171.7810218978, 97.7615571776], [171.0827250608, 98.4598540146], [171.7810218978, 99.1581508516], [171.0827250608, 99.8564476886], [171.0827250608, 104.7445255474], [173.8759124088, 104.7445255474], [174.5742092457, 104.0462287105], [178.7639902676, 104.0462287105], [178.7639902676, 100.5547445255], [179.4622871046, 99.8564476886], [178.7639902676, 99.1581508516], [178.7639902676, 92.1751824818], [179.4622871046, 91.4768856448], [179.4622871046, 86.5888077859], [178.7639902676, 85.8905109489], [178.7639902676, 84.4939172749], [179.4622871046, 83.7956204380], [178.7639902676, 83.0973236010], [179.4622871046, 82.3990267640], [179.4622871046, 81.0024330900], [180.1605839416, 80.3041362530], [180.1605839416, 79.6058394161], [180.8588807786, 78.9075425791], [180.8588807786, 70.5279805353], [180.1605839416, 69.8296836983], [180.1605839416, 65.6399026764]]);
											polygon(paths = [[0, 1, 2, 3, 4, 5, 6, 7, 8, 9, 10, 11, 12, 13, 14, 15, 16, 17, 18, 19, 20, 21, 22, 23]], points = [[156.4184914842, 65.6399026764], [155.7201946472, 66.3381995134], [155.7201946472, 70.5279805353], [155.0218978102, 71.2262773723], [154.3236009732, 70.5279805353], [154.3236009732, 69.8296836983], [153.6253041363, 69.1313868613], [153.6253041363, 67.7347931873], [152.9270072993, 67.0364963504], [152.9270072993, 71.2262773723], [153.6253041363, 71.9245742092], [153.6253041363, 72.6228710462], [155.0218978102, 71.2262773723], [155.7201946472, 71.2262773723], [156.4184914842, 71.9245742092], [156.4184914842, 73.3211678832], [155.7201946472, 74.0194647202], [156.4184914842, 74.7177615572], [164.7980535280, 74.7177615572], [164.7980535280, 66.3381995134], [164.0997566910, 65.6399026764], [163.4014598540, 65.6399026764], [162.7031630170, 66.3381995134], [162.0048661800, 65.6399026764]]);
											polygon(paths = [[0, 1]], points = [[219.2652068127, 64.2433090024], [219.2652068127, 66.3381995134]]);
											polygon(paths = [[0]], points = [[219.2652068127, 62.8467153285]]);
											polygon(paths = [[0]], points = [[88.6836982968, 61.4501216545]]);
										}
									}
								}
							}
						}
						translate(v = [314, 360.53253012048197, 136.23855421686747]) {
							rotate(a = 90, v = [-1, 0, 0]) {
								rotate(a = 90, v = [0, 1, 0]) {
									linear_extrude(center = true, height = 200) {
										polygon(paths = [[0, 1, 2, 3]], points = [[237.2072289157, 98.8939759036], [237.2072289157, 99.5855421687], [237.8987951807, 100.2771084337], [237.8987951807, 98.8939759036]]);
										polygon(paths = [[0, 1, 2, 3, 4, 5, 6, 7, 8, 9]], points = [[265.5614457831, 97.5108433735], [265.5614457831, 98.2024096386], [264.1783132530, 99.5855421687], [262.7951807229, 99.5855421687], [263.4867469880, 99.5855421687], [264.1783132530, 100.2771084337], [264.8698795181, 99.5855421687], [265.5614457831, 100.2771084337], [266.2530120482, 100.2771084337], [266.2530120482, 97.5108433735]]);
										polygon(paths = [[0, 1, 2, 3, 4, 5, 6, 7]], points = [[263.4867469880, 42.8771084337], [264.1783132530, 42.8771084337], [264.8698795181, 43.5686746988], [264.8698795181, 44.2602409639], [265.5614457831, 44.9518072289], [265.5614457831, 47.7180722892], [266.2530120482, 48.4096385542], [266.2530120482, 42.8771084337]]);
										polygon(paths = [[0, 1, 2, 3, 4, 5, 6, 7, 8, 9]], points = [[33.8867469880, 42.1855421687], [33.8867469880, 42.8771084337], [33.1951807229, 43.5686746988], [33.1951807229, 70.5397590361], [33.8867469880, 71.2313253012], [42.1855421687, 71.2313253012], [42.8771084337, 70.5397590361], [62.2409638554, 70.5397590361], [62.2409638554, 42.8771084337], [61.5493975904, 42.1855421687]]);
									}
								}
							}
						}
					}
					translate(v = [-13, 61.805755395683455, 149.35011990407676]) {
						rotate(a = 90, v = [-1, 0, 0]) {
							rotate(a = 90, v = [0, -1, 0]) {
								linear_extrude(center = true, height = 200) {
									polygon(paths = [[0, 1, 2, 3, 4, 5, 6, 7, 8, 9, 10, 11, 12]], points = [[97.0431654676, 69.5131894484], [97.7314148681, 69.5131894484], [98.4196642686, 70.2014388489], [98.4196642686, 70.8896882494], [99.1079136691, 71.5779376499], [99.1079136691, 74.3309352518], [98.4196642686, 75.0191846523], [96.3549160671, 75.0191846523], [95.6666666667, 74.3309352518], [95.6666666667, 73.6426858513], [94.9784172662, 72.9544364508], [95.6666666667, 72.2661870504], [95.6666666667, 70.8896882494]]);
									polygon(paths = [[0, 1]], points = [[47.4892086331, 136.9616306954], [47.4892086331, 137.6498800959]]);
									polygon(paths = [[0, 1, 2, 3, 4, 5, 6, 7, 8, 9, 10, 11]], points = [[47.4892086331, 67.4484412470], [47.4892086331, 70.2014388489], [46.8009592326, 70.8896882494], [46.8009592326, 76.3956834532], [47.4892086331, 77.0839328537], [48.1774580336, 77.0839328537], [48.1774580336, 75.7074340528], [48.8657074341, 75.0191846523], [48.8657074341, 70.8896882494], [48.1774580336, 70.2014388489], [48.8657074341, 69.5131894484], [48.8657074341, 68.8249400480]]);
								}
							}
						}
					}
				}
			}
		}
	}
}
